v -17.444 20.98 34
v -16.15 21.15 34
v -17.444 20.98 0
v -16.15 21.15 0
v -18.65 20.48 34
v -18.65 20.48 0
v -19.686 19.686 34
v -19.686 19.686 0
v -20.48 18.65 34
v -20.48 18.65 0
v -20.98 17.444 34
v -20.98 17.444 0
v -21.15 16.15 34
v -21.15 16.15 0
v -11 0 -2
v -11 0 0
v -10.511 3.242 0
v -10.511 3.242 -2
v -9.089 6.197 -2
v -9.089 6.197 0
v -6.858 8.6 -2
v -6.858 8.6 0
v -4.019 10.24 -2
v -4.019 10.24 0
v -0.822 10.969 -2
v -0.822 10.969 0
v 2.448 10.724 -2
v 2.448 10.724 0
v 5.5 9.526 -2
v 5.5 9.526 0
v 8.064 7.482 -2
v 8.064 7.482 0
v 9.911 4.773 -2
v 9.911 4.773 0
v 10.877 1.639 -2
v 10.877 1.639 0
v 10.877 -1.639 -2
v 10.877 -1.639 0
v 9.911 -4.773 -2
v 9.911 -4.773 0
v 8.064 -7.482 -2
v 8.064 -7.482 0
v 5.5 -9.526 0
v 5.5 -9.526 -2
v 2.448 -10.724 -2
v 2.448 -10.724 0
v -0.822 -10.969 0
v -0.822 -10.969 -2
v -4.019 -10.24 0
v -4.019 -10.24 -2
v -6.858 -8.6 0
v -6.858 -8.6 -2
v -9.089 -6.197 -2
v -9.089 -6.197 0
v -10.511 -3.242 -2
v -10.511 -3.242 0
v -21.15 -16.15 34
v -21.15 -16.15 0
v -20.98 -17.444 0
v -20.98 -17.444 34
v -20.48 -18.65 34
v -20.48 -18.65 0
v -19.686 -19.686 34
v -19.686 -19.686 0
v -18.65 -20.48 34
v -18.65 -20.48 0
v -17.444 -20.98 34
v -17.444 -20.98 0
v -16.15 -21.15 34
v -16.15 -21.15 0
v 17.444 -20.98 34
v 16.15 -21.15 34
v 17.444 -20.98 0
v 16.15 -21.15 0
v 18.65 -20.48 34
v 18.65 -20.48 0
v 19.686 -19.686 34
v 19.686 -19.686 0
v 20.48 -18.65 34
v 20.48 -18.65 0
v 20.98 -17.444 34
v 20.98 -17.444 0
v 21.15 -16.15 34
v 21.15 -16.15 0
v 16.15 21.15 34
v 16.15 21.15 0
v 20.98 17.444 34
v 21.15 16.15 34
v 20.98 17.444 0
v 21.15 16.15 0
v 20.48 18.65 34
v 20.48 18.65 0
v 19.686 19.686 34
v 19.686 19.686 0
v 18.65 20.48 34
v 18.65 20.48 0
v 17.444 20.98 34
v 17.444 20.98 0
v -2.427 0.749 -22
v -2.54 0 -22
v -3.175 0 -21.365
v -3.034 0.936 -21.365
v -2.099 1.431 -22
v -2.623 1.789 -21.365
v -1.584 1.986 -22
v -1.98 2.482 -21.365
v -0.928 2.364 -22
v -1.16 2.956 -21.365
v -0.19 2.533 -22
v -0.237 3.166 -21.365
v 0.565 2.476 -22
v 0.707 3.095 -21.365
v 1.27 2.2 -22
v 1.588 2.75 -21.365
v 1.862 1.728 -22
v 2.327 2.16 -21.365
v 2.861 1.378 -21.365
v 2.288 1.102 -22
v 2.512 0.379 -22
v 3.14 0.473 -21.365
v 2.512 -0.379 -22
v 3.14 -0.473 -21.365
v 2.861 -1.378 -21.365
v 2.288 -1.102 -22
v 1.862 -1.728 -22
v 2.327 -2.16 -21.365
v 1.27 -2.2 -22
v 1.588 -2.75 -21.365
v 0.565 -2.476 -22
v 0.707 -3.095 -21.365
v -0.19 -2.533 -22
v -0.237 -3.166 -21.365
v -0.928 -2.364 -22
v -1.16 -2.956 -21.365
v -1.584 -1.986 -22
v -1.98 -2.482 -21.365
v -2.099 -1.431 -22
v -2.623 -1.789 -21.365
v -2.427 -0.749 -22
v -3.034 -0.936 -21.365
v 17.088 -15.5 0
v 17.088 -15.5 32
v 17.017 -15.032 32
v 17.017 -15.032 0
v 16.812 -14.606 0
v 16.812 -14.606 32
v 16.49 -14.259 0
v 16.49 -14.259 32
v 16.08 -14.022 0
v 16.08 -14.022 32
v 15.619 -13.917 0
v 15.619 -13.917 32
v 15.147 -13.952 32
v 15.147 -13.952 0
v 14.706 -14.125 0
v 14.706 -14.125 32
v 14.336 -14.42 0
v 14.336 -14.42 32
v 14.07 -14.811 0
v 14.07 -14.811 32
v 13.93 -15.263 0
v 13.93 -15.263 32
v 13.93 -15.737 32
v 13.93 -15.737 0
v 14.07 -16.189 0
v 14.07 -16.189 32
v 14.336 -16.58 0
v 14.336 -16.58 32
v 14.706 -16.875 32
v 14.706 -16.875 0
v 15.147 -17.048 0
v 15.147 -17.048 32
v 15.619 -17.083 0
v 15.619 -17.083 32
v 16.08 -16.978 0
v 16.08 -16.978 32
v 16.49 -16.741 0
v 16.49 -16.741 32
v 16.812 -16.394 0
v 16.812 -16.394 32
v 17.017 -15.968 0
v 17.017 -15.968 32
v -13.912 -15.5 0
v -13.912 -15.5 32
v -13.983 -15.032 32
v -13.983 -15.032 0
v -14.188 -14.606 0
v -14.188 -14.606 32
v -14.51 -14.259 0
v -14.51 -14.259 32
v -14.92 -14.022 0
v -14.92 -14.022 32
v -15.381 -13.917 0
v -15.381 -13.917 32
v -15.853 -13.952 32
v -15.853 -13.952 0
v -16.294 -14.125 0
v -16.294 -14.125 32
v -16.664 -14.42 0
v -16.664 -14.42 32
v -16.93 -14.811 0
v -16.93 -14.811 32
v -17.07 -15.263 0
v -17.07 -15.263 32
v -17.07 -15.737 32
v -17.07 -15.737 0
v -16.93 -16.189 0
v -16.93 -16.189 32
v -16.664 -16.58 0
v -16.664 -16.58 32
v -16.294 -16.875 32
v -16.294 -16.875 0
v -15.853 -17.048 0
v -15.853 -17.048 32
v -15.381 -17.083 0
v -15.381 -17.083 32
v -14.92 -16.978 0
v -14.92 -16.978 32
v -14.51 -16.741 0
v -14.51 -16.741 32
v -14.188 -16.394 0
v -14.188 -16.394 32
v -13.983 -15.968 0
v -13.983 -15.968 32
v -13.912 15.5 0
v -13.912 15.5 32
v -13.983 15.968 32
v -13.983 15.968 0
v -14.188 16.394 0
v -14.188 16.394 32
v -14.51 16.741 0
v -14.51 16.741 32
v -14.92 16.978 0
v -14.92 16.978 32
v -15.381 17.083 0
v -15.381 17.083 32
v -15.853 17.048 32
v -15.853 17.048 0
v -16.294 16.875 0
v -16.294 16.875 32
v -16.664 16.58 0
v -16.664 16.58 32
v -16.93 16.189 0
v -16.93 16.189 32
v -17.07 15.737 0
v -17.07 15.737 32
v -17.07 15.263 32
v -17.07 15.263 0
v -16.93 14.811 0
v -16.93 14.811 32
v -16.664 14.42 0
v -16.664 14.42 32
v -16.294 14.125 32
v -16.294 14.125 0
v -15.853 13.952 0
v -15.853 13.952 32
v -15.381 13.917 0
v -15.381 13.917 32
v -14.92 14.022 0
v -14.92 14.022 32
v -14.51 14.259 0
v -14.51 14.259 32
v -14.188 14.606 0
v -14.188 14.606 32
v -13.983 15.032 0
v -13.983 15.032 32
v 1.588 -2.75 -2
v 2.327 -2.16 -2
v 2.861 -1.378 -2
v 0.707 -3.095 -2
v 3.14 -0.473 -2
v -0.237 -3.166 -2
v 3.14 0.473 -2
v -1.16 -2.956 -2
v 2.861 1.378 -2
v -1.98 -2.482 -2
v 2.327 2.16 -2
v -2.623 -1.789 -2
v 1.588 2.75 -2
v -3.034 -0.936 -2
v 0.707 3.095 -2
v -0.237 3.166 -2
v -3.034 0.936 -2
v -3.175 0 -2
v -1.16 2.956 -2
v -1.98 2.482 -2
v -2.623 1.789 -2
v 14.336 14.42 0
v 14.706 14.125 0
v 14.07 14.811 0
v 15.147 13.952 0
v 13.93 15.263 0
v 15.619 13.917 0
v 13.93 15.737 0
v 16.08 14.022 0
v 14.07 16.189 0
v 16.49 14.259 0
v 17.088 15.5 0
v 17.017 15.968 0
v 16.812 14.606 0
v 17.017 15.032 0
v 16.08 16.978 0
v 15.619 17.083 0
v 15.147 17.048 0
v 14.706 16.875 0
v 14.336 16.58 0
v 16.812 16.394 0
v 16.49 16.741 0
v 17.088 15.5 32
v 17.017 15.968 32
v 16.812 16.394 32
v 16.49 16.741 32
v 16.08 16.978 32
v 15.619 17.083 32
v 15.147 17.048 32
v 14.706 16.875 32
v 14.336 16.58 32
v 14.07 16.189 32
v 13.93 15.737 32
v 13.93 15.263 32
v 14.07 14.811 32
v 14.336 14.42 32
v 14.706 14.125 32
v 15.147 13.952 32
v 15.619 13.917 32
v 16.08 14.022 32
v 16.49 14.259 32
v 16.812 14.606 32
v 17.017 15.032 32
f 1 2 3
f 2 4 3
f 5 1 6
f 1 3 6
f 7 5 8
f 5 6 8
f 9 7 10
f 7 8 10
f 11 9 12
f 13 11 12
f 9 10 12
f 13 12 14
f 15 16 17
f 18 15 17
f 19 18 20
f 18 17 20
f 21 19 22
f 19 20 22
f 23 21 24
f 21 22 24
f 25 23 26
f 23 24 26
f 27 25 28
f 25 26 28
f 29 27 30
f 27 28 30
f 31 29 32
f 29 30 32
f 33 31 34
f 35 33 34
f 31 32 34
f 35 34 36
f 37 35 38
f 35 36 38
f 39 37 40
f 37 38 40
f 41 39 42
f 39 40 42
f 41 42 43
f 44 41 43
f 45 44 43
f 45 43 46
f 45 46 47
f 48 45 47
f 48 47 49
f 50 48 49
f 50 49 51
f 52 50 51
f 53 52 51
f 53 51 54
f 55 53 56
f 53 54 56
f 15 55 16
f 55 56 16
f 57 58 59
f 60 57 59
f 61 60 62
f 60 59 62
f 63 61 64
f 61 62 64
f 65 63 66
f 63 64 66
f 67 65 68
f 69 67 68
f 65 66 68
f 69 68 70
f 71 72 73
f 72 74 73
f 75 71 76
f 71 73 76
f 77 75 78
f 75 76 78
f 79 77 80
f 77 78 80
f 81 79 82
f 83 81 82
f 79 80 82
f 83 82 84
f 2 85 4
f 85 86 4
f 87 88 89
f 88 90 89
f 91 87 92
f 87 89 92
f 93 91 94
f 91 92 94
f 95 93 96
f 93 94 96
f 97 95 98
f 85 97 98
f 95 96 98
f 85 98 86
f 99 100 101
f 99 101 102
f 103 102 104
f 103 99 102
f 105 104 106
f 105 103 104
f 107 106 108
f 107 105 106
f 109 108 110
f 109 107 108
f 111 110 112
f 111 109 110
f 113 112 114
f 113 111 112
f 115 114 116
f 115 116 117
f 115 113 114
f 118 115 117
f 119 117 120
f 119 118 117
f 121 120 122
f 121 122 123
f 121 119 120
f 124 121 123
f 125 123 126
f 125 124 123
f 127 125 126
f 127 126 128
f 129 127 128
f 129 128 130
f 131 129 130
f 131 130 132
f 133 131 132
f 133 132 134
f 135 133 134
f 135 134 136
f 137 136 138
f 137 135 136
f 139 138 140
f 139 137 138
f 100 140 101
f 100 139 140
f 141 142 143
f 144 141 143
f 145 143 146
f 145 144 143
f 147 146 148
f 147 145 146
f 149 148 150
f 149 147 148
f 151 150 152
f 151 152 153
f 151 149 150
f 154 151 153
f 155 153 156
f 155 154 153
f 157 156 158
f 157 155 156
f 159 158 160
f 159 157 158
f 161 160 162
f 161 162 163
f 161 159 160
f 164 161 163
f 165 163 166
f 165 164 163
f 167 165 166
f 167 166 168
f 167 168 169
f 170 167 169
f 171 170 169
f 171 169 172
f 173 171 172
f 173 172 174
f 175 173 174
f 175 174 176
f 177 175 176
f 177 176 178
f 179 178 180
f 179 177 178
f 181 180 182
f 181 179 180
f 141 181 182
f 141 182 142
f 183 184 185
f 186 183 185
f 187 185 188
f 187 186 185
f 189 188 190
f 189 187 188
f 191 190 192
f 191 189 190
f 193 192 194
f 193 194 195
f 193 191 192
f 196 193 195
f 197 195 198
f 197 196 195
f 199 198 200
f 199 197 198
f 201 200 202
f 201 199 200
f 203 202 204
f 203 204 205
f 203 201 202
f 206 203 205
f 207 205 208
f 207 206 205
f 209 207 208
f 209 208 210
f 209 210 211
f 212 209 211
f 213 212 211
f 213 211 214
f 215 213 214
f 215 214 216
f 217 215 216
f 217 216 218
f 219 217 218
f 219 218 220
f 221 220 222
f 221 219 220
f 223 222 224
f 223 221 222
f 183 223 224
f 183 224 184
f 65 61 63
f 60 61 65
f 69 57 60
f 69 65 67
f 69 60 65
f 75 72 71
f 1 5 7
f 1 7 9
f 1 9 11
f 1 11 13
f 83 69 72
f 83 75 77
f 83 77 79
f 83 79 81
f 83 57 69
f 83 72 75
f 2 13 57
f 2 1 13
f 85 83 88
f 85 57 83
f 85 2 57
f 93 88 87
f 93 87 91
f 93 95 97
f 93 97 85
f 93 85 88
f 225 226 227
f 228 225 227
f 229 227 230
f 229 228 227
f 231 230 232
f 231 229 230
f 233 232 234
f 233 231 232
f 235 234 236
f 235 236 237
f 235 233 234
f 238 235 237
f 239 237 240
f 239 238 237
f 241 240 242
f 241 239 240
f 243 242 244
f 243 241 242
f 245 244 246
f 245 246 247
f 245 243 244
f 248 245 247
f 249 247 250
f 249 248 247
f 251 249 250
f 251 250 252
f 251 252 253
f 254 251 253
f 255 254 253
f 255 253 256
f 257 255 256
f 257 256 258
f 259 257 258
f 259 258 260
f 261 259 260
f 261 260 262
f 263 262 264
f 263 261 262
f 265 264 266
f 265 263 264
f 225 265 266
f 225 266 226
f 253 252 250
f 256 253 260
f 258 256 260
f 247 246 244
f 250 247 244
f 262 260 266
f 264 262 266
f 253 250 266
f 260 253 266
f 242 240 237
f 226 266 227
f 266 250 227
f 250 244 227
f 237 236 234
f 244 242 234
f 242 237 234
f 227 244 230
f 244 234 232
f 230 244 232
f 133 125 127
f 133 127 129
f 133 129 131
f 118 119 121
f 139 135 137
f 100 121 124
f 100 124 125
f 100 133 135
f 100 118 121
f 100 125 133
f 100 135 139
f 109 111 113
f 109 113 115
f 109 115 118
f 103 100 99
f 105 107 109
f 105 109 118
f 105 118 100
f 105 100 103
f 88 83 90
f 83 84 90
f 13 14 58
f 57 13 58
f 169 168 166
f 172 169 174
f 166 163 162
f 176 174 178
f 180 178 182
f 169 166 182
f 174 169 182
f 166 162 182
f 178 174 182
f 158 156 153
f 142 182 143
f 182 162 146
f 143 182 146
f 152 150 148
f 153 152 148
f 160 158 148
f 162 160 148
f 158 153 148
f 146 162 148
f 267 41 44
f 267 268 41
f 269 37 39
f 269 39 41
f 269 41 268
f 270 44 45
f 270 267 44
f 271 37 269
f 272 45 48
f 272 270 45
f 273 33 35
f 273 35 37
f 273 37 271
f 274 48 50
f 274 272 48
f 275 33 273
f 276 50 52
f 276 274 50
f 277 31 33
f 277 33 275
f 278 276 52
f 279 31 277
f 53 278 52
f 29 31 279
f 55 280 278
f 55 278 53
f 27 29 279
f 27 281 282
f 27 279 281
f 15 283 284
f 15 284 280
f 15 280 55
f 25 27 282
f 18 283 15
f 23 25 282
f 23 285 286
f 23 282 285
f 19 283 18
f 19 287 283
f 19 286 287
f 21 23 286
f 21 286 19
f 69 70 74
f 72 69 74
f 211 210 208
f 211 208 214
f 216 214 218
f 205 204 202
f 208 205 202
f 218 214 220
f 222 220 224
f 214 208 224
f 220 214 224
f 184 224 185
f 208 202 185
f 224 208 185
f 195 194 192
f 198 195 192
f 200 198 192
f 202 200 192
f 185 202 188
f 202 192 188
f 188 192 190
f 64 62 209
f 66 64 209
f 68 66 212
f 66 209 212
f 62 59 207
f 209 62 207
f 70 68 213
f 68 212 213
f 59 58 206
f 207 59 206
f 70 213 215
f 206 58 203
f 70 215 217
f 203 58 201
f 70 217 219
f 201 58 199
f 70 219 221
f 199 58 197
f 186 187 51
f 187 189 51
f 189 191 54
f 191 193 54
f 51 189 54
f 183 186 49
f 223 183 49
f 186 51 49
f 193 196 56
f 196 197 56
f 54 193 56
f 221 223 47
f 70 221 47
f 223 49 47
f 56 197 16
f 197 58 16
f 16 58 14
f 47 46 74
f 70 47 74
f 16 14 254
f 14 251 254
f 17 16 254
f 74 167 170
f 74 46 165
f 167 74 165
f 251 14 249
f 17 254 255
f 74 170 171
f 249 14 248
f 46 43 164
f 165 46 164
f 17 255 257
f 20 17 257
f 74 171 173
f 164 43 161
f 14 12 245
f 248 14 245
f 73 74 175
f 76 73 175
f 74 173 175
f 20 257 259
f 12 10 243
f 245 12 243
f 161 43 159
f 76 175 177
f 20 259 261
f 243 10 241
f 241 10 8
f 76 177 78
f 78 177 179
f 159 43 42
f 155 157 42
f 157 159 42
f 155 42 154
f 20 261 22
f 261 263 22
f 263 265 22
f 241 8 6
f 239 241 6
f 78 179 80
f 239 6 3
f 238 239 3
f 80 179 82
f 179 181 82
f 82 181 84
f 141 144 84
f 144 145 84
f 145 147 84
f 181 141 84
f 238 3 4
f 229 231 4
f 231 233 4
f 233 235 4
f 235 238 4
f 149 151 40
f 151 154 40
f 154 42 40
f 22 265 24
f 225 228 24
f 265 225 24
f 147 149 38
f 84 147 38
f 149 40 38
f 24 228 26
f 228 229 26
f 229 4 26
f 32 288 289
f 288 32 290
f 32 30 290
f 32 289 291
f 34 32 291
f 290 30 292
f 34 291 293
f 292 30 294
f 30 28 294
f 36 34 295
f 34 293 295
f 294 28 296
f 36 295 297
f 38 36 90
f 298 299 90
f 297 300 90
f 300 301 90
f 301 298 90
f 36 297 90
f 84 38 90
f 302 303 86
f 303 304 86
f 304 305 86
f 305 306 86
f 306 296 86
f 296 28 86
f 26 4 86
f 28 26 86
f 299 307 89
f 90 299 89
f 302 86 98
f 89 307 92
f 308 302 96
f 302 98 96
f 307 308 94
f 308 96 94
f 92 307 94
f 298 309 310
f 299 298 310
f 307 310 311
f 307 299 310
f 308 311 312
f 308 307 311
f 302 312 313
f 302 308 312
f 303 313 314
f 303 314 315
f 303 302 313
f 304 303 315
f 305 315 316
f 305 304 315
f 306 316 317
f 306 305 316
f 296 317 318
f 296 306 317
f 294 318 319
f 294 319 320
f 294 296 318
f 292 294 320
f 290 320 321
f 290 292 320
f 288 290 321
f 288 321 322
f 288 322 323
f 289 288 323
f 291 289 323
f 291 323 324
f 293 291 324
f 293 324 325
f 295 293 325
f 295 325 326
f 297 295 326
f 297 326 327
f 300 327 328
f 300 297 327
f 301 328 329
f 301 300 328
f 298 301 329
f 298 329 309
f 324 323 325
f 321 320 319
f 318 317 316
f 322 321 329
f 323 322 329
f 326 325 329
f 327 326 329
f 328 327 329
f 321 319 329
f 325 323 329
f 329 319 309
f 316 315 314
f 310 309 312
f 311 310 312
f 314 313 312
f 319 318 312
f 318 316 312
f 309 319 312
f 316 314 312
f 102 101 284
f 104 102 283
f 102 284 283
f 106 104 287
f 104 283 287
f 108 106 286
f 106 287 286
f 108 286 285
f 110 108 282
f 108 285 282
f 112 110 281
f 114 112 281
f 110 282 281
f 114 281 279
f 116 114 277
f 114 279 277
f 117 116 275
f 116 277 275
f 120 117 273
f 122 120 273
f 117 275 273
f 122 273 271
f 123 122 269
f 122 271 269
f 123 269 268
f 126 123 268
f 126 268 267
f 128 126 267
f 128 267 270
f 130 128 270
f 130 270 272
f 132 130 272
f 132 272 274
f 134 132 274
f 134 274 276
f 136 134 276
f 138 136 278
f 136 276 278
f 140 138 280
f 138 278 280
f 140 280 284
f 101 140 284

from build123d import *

# Parameters (mm, degrees)
SKETCH1_R           = 1.5875
BOSS_EXTRUDE1_DEPTH = 32
BOSS_EXTRUDE2_DEPTH = 2
SKETCH3_R           = 11
BOSS_EXTRUDE3_DEPTH = 2
SKETCH4_R           = 3.175
BOSS_EXTRUDE4_DEPTH = 20
CHAMFER1_SIZE       = 0.635


with BuildPart() as part:
    # Sketch1 → Boss-Extrude1 (new body)
    with BuildSketch(Plane.XY):
        with BuildLine():
            Line((-16.15, -21.15), (16.15, -21.15))
            ThreePointArc((16.15, -21.15), (19.685533906, -19.685533906), (21.15, -16.15))
            Line((21.15, -16.15), (21.15, 16.15))
            ThreePointArc((21.15, 16.15), (19.685533906, 19.685533906), (16.15, 21.15))
            Line((16.15, 21.15), (-16.15, 21.15))
            ThreePointArc((-16.15, 21.15), (-19.685533906, 19.685533906), (-21.15, 16.15))
            Line((-21.15, 16.15), (-21.15, -16.15))
            ThreePointArc((-21.15, -16.15), (-19.685533906, -19.685533906), (-16.15, -21.15))
        make_face()
        with Locations((15.5, 15.5)):
            Circle(SKETCH1_R, mode=Mode.SUBTRACT)
        with Locations((-15.5, 15.5)):
            Circle(SKETCH1_R, mode=Mode.SUBTRACT)
        with Locations((15.5, -15.5)):
            Circle(SKETCH1_R, mode=Mode.SUBTRACT)
        with Locations((-15.5, -15.5)):
            Circle(SKETCH1_R, mode=Mode.SUBTRACT)
    extrude(amount=BOSS_EXTRUDE1_DEPTH)

    # Sketch2 → Boss-Extrude2 (add)
    with BuildSketch(Plane.XY.offset(32)):
        with BuildLine():
            Line((-16.15, -21.15), (16.15, -21.15))
            ThreePointArc((16.15, -21.15), (19.685533906, -19.685533906), (21.15, -16.15))
            Line((21.15, -16.15), (21.15, 16.15))
            ThreePointArc((21.15, 16.15), (19.685533906, 19.685533906), (16.15, 21.15))
            Line((16.15, 21.15), (-16.15, 21.15))
            ThreePointArc((-16.15, 21.15), (-19.685533906, 19.685533906), (-21.15, 16.15))
            Line((-21.15, 16.15), (-21.15, -16.15))
            ThreePointArc((-21.15, -16.15), (-19.685533906, -19.685533906), (-16.15, -21.15))
        make_face()
    extrude(amount=BOSS_EXTRUDE2_DEPTH)

    # Sketch3 → Boss-Extrude3 (add)
    with BuildSketch(Plane(origin=(0, 0, 0), x_dir=(-1, 0, 0), z_dir=(0, 0, -1))):
        Circle(SKETCH3_R)
    extrude(amount=BOSS_EXTRUDE3_DEPTH)

    # Sketch4 → Boss-Extrude4 (add)
    with BuildSketch(Plane(origin=(0, 0, -2), x_dir=(-1, 0, 0), z_dir=(0, 0, -1))):
        Circle(SKETCH4_R)
    extrude(amount=BOSS_EXTRUDE4_DEPTH)

    # Chamfer1
    chamfer1_edges = [part.edges().sort_by_distance(p)[0] for p in [
        (3.175, 0, -22),
    ]]
    chamfer(chamfer1_edges, length=CHAMFER1_SIZE)


solid = part.part
